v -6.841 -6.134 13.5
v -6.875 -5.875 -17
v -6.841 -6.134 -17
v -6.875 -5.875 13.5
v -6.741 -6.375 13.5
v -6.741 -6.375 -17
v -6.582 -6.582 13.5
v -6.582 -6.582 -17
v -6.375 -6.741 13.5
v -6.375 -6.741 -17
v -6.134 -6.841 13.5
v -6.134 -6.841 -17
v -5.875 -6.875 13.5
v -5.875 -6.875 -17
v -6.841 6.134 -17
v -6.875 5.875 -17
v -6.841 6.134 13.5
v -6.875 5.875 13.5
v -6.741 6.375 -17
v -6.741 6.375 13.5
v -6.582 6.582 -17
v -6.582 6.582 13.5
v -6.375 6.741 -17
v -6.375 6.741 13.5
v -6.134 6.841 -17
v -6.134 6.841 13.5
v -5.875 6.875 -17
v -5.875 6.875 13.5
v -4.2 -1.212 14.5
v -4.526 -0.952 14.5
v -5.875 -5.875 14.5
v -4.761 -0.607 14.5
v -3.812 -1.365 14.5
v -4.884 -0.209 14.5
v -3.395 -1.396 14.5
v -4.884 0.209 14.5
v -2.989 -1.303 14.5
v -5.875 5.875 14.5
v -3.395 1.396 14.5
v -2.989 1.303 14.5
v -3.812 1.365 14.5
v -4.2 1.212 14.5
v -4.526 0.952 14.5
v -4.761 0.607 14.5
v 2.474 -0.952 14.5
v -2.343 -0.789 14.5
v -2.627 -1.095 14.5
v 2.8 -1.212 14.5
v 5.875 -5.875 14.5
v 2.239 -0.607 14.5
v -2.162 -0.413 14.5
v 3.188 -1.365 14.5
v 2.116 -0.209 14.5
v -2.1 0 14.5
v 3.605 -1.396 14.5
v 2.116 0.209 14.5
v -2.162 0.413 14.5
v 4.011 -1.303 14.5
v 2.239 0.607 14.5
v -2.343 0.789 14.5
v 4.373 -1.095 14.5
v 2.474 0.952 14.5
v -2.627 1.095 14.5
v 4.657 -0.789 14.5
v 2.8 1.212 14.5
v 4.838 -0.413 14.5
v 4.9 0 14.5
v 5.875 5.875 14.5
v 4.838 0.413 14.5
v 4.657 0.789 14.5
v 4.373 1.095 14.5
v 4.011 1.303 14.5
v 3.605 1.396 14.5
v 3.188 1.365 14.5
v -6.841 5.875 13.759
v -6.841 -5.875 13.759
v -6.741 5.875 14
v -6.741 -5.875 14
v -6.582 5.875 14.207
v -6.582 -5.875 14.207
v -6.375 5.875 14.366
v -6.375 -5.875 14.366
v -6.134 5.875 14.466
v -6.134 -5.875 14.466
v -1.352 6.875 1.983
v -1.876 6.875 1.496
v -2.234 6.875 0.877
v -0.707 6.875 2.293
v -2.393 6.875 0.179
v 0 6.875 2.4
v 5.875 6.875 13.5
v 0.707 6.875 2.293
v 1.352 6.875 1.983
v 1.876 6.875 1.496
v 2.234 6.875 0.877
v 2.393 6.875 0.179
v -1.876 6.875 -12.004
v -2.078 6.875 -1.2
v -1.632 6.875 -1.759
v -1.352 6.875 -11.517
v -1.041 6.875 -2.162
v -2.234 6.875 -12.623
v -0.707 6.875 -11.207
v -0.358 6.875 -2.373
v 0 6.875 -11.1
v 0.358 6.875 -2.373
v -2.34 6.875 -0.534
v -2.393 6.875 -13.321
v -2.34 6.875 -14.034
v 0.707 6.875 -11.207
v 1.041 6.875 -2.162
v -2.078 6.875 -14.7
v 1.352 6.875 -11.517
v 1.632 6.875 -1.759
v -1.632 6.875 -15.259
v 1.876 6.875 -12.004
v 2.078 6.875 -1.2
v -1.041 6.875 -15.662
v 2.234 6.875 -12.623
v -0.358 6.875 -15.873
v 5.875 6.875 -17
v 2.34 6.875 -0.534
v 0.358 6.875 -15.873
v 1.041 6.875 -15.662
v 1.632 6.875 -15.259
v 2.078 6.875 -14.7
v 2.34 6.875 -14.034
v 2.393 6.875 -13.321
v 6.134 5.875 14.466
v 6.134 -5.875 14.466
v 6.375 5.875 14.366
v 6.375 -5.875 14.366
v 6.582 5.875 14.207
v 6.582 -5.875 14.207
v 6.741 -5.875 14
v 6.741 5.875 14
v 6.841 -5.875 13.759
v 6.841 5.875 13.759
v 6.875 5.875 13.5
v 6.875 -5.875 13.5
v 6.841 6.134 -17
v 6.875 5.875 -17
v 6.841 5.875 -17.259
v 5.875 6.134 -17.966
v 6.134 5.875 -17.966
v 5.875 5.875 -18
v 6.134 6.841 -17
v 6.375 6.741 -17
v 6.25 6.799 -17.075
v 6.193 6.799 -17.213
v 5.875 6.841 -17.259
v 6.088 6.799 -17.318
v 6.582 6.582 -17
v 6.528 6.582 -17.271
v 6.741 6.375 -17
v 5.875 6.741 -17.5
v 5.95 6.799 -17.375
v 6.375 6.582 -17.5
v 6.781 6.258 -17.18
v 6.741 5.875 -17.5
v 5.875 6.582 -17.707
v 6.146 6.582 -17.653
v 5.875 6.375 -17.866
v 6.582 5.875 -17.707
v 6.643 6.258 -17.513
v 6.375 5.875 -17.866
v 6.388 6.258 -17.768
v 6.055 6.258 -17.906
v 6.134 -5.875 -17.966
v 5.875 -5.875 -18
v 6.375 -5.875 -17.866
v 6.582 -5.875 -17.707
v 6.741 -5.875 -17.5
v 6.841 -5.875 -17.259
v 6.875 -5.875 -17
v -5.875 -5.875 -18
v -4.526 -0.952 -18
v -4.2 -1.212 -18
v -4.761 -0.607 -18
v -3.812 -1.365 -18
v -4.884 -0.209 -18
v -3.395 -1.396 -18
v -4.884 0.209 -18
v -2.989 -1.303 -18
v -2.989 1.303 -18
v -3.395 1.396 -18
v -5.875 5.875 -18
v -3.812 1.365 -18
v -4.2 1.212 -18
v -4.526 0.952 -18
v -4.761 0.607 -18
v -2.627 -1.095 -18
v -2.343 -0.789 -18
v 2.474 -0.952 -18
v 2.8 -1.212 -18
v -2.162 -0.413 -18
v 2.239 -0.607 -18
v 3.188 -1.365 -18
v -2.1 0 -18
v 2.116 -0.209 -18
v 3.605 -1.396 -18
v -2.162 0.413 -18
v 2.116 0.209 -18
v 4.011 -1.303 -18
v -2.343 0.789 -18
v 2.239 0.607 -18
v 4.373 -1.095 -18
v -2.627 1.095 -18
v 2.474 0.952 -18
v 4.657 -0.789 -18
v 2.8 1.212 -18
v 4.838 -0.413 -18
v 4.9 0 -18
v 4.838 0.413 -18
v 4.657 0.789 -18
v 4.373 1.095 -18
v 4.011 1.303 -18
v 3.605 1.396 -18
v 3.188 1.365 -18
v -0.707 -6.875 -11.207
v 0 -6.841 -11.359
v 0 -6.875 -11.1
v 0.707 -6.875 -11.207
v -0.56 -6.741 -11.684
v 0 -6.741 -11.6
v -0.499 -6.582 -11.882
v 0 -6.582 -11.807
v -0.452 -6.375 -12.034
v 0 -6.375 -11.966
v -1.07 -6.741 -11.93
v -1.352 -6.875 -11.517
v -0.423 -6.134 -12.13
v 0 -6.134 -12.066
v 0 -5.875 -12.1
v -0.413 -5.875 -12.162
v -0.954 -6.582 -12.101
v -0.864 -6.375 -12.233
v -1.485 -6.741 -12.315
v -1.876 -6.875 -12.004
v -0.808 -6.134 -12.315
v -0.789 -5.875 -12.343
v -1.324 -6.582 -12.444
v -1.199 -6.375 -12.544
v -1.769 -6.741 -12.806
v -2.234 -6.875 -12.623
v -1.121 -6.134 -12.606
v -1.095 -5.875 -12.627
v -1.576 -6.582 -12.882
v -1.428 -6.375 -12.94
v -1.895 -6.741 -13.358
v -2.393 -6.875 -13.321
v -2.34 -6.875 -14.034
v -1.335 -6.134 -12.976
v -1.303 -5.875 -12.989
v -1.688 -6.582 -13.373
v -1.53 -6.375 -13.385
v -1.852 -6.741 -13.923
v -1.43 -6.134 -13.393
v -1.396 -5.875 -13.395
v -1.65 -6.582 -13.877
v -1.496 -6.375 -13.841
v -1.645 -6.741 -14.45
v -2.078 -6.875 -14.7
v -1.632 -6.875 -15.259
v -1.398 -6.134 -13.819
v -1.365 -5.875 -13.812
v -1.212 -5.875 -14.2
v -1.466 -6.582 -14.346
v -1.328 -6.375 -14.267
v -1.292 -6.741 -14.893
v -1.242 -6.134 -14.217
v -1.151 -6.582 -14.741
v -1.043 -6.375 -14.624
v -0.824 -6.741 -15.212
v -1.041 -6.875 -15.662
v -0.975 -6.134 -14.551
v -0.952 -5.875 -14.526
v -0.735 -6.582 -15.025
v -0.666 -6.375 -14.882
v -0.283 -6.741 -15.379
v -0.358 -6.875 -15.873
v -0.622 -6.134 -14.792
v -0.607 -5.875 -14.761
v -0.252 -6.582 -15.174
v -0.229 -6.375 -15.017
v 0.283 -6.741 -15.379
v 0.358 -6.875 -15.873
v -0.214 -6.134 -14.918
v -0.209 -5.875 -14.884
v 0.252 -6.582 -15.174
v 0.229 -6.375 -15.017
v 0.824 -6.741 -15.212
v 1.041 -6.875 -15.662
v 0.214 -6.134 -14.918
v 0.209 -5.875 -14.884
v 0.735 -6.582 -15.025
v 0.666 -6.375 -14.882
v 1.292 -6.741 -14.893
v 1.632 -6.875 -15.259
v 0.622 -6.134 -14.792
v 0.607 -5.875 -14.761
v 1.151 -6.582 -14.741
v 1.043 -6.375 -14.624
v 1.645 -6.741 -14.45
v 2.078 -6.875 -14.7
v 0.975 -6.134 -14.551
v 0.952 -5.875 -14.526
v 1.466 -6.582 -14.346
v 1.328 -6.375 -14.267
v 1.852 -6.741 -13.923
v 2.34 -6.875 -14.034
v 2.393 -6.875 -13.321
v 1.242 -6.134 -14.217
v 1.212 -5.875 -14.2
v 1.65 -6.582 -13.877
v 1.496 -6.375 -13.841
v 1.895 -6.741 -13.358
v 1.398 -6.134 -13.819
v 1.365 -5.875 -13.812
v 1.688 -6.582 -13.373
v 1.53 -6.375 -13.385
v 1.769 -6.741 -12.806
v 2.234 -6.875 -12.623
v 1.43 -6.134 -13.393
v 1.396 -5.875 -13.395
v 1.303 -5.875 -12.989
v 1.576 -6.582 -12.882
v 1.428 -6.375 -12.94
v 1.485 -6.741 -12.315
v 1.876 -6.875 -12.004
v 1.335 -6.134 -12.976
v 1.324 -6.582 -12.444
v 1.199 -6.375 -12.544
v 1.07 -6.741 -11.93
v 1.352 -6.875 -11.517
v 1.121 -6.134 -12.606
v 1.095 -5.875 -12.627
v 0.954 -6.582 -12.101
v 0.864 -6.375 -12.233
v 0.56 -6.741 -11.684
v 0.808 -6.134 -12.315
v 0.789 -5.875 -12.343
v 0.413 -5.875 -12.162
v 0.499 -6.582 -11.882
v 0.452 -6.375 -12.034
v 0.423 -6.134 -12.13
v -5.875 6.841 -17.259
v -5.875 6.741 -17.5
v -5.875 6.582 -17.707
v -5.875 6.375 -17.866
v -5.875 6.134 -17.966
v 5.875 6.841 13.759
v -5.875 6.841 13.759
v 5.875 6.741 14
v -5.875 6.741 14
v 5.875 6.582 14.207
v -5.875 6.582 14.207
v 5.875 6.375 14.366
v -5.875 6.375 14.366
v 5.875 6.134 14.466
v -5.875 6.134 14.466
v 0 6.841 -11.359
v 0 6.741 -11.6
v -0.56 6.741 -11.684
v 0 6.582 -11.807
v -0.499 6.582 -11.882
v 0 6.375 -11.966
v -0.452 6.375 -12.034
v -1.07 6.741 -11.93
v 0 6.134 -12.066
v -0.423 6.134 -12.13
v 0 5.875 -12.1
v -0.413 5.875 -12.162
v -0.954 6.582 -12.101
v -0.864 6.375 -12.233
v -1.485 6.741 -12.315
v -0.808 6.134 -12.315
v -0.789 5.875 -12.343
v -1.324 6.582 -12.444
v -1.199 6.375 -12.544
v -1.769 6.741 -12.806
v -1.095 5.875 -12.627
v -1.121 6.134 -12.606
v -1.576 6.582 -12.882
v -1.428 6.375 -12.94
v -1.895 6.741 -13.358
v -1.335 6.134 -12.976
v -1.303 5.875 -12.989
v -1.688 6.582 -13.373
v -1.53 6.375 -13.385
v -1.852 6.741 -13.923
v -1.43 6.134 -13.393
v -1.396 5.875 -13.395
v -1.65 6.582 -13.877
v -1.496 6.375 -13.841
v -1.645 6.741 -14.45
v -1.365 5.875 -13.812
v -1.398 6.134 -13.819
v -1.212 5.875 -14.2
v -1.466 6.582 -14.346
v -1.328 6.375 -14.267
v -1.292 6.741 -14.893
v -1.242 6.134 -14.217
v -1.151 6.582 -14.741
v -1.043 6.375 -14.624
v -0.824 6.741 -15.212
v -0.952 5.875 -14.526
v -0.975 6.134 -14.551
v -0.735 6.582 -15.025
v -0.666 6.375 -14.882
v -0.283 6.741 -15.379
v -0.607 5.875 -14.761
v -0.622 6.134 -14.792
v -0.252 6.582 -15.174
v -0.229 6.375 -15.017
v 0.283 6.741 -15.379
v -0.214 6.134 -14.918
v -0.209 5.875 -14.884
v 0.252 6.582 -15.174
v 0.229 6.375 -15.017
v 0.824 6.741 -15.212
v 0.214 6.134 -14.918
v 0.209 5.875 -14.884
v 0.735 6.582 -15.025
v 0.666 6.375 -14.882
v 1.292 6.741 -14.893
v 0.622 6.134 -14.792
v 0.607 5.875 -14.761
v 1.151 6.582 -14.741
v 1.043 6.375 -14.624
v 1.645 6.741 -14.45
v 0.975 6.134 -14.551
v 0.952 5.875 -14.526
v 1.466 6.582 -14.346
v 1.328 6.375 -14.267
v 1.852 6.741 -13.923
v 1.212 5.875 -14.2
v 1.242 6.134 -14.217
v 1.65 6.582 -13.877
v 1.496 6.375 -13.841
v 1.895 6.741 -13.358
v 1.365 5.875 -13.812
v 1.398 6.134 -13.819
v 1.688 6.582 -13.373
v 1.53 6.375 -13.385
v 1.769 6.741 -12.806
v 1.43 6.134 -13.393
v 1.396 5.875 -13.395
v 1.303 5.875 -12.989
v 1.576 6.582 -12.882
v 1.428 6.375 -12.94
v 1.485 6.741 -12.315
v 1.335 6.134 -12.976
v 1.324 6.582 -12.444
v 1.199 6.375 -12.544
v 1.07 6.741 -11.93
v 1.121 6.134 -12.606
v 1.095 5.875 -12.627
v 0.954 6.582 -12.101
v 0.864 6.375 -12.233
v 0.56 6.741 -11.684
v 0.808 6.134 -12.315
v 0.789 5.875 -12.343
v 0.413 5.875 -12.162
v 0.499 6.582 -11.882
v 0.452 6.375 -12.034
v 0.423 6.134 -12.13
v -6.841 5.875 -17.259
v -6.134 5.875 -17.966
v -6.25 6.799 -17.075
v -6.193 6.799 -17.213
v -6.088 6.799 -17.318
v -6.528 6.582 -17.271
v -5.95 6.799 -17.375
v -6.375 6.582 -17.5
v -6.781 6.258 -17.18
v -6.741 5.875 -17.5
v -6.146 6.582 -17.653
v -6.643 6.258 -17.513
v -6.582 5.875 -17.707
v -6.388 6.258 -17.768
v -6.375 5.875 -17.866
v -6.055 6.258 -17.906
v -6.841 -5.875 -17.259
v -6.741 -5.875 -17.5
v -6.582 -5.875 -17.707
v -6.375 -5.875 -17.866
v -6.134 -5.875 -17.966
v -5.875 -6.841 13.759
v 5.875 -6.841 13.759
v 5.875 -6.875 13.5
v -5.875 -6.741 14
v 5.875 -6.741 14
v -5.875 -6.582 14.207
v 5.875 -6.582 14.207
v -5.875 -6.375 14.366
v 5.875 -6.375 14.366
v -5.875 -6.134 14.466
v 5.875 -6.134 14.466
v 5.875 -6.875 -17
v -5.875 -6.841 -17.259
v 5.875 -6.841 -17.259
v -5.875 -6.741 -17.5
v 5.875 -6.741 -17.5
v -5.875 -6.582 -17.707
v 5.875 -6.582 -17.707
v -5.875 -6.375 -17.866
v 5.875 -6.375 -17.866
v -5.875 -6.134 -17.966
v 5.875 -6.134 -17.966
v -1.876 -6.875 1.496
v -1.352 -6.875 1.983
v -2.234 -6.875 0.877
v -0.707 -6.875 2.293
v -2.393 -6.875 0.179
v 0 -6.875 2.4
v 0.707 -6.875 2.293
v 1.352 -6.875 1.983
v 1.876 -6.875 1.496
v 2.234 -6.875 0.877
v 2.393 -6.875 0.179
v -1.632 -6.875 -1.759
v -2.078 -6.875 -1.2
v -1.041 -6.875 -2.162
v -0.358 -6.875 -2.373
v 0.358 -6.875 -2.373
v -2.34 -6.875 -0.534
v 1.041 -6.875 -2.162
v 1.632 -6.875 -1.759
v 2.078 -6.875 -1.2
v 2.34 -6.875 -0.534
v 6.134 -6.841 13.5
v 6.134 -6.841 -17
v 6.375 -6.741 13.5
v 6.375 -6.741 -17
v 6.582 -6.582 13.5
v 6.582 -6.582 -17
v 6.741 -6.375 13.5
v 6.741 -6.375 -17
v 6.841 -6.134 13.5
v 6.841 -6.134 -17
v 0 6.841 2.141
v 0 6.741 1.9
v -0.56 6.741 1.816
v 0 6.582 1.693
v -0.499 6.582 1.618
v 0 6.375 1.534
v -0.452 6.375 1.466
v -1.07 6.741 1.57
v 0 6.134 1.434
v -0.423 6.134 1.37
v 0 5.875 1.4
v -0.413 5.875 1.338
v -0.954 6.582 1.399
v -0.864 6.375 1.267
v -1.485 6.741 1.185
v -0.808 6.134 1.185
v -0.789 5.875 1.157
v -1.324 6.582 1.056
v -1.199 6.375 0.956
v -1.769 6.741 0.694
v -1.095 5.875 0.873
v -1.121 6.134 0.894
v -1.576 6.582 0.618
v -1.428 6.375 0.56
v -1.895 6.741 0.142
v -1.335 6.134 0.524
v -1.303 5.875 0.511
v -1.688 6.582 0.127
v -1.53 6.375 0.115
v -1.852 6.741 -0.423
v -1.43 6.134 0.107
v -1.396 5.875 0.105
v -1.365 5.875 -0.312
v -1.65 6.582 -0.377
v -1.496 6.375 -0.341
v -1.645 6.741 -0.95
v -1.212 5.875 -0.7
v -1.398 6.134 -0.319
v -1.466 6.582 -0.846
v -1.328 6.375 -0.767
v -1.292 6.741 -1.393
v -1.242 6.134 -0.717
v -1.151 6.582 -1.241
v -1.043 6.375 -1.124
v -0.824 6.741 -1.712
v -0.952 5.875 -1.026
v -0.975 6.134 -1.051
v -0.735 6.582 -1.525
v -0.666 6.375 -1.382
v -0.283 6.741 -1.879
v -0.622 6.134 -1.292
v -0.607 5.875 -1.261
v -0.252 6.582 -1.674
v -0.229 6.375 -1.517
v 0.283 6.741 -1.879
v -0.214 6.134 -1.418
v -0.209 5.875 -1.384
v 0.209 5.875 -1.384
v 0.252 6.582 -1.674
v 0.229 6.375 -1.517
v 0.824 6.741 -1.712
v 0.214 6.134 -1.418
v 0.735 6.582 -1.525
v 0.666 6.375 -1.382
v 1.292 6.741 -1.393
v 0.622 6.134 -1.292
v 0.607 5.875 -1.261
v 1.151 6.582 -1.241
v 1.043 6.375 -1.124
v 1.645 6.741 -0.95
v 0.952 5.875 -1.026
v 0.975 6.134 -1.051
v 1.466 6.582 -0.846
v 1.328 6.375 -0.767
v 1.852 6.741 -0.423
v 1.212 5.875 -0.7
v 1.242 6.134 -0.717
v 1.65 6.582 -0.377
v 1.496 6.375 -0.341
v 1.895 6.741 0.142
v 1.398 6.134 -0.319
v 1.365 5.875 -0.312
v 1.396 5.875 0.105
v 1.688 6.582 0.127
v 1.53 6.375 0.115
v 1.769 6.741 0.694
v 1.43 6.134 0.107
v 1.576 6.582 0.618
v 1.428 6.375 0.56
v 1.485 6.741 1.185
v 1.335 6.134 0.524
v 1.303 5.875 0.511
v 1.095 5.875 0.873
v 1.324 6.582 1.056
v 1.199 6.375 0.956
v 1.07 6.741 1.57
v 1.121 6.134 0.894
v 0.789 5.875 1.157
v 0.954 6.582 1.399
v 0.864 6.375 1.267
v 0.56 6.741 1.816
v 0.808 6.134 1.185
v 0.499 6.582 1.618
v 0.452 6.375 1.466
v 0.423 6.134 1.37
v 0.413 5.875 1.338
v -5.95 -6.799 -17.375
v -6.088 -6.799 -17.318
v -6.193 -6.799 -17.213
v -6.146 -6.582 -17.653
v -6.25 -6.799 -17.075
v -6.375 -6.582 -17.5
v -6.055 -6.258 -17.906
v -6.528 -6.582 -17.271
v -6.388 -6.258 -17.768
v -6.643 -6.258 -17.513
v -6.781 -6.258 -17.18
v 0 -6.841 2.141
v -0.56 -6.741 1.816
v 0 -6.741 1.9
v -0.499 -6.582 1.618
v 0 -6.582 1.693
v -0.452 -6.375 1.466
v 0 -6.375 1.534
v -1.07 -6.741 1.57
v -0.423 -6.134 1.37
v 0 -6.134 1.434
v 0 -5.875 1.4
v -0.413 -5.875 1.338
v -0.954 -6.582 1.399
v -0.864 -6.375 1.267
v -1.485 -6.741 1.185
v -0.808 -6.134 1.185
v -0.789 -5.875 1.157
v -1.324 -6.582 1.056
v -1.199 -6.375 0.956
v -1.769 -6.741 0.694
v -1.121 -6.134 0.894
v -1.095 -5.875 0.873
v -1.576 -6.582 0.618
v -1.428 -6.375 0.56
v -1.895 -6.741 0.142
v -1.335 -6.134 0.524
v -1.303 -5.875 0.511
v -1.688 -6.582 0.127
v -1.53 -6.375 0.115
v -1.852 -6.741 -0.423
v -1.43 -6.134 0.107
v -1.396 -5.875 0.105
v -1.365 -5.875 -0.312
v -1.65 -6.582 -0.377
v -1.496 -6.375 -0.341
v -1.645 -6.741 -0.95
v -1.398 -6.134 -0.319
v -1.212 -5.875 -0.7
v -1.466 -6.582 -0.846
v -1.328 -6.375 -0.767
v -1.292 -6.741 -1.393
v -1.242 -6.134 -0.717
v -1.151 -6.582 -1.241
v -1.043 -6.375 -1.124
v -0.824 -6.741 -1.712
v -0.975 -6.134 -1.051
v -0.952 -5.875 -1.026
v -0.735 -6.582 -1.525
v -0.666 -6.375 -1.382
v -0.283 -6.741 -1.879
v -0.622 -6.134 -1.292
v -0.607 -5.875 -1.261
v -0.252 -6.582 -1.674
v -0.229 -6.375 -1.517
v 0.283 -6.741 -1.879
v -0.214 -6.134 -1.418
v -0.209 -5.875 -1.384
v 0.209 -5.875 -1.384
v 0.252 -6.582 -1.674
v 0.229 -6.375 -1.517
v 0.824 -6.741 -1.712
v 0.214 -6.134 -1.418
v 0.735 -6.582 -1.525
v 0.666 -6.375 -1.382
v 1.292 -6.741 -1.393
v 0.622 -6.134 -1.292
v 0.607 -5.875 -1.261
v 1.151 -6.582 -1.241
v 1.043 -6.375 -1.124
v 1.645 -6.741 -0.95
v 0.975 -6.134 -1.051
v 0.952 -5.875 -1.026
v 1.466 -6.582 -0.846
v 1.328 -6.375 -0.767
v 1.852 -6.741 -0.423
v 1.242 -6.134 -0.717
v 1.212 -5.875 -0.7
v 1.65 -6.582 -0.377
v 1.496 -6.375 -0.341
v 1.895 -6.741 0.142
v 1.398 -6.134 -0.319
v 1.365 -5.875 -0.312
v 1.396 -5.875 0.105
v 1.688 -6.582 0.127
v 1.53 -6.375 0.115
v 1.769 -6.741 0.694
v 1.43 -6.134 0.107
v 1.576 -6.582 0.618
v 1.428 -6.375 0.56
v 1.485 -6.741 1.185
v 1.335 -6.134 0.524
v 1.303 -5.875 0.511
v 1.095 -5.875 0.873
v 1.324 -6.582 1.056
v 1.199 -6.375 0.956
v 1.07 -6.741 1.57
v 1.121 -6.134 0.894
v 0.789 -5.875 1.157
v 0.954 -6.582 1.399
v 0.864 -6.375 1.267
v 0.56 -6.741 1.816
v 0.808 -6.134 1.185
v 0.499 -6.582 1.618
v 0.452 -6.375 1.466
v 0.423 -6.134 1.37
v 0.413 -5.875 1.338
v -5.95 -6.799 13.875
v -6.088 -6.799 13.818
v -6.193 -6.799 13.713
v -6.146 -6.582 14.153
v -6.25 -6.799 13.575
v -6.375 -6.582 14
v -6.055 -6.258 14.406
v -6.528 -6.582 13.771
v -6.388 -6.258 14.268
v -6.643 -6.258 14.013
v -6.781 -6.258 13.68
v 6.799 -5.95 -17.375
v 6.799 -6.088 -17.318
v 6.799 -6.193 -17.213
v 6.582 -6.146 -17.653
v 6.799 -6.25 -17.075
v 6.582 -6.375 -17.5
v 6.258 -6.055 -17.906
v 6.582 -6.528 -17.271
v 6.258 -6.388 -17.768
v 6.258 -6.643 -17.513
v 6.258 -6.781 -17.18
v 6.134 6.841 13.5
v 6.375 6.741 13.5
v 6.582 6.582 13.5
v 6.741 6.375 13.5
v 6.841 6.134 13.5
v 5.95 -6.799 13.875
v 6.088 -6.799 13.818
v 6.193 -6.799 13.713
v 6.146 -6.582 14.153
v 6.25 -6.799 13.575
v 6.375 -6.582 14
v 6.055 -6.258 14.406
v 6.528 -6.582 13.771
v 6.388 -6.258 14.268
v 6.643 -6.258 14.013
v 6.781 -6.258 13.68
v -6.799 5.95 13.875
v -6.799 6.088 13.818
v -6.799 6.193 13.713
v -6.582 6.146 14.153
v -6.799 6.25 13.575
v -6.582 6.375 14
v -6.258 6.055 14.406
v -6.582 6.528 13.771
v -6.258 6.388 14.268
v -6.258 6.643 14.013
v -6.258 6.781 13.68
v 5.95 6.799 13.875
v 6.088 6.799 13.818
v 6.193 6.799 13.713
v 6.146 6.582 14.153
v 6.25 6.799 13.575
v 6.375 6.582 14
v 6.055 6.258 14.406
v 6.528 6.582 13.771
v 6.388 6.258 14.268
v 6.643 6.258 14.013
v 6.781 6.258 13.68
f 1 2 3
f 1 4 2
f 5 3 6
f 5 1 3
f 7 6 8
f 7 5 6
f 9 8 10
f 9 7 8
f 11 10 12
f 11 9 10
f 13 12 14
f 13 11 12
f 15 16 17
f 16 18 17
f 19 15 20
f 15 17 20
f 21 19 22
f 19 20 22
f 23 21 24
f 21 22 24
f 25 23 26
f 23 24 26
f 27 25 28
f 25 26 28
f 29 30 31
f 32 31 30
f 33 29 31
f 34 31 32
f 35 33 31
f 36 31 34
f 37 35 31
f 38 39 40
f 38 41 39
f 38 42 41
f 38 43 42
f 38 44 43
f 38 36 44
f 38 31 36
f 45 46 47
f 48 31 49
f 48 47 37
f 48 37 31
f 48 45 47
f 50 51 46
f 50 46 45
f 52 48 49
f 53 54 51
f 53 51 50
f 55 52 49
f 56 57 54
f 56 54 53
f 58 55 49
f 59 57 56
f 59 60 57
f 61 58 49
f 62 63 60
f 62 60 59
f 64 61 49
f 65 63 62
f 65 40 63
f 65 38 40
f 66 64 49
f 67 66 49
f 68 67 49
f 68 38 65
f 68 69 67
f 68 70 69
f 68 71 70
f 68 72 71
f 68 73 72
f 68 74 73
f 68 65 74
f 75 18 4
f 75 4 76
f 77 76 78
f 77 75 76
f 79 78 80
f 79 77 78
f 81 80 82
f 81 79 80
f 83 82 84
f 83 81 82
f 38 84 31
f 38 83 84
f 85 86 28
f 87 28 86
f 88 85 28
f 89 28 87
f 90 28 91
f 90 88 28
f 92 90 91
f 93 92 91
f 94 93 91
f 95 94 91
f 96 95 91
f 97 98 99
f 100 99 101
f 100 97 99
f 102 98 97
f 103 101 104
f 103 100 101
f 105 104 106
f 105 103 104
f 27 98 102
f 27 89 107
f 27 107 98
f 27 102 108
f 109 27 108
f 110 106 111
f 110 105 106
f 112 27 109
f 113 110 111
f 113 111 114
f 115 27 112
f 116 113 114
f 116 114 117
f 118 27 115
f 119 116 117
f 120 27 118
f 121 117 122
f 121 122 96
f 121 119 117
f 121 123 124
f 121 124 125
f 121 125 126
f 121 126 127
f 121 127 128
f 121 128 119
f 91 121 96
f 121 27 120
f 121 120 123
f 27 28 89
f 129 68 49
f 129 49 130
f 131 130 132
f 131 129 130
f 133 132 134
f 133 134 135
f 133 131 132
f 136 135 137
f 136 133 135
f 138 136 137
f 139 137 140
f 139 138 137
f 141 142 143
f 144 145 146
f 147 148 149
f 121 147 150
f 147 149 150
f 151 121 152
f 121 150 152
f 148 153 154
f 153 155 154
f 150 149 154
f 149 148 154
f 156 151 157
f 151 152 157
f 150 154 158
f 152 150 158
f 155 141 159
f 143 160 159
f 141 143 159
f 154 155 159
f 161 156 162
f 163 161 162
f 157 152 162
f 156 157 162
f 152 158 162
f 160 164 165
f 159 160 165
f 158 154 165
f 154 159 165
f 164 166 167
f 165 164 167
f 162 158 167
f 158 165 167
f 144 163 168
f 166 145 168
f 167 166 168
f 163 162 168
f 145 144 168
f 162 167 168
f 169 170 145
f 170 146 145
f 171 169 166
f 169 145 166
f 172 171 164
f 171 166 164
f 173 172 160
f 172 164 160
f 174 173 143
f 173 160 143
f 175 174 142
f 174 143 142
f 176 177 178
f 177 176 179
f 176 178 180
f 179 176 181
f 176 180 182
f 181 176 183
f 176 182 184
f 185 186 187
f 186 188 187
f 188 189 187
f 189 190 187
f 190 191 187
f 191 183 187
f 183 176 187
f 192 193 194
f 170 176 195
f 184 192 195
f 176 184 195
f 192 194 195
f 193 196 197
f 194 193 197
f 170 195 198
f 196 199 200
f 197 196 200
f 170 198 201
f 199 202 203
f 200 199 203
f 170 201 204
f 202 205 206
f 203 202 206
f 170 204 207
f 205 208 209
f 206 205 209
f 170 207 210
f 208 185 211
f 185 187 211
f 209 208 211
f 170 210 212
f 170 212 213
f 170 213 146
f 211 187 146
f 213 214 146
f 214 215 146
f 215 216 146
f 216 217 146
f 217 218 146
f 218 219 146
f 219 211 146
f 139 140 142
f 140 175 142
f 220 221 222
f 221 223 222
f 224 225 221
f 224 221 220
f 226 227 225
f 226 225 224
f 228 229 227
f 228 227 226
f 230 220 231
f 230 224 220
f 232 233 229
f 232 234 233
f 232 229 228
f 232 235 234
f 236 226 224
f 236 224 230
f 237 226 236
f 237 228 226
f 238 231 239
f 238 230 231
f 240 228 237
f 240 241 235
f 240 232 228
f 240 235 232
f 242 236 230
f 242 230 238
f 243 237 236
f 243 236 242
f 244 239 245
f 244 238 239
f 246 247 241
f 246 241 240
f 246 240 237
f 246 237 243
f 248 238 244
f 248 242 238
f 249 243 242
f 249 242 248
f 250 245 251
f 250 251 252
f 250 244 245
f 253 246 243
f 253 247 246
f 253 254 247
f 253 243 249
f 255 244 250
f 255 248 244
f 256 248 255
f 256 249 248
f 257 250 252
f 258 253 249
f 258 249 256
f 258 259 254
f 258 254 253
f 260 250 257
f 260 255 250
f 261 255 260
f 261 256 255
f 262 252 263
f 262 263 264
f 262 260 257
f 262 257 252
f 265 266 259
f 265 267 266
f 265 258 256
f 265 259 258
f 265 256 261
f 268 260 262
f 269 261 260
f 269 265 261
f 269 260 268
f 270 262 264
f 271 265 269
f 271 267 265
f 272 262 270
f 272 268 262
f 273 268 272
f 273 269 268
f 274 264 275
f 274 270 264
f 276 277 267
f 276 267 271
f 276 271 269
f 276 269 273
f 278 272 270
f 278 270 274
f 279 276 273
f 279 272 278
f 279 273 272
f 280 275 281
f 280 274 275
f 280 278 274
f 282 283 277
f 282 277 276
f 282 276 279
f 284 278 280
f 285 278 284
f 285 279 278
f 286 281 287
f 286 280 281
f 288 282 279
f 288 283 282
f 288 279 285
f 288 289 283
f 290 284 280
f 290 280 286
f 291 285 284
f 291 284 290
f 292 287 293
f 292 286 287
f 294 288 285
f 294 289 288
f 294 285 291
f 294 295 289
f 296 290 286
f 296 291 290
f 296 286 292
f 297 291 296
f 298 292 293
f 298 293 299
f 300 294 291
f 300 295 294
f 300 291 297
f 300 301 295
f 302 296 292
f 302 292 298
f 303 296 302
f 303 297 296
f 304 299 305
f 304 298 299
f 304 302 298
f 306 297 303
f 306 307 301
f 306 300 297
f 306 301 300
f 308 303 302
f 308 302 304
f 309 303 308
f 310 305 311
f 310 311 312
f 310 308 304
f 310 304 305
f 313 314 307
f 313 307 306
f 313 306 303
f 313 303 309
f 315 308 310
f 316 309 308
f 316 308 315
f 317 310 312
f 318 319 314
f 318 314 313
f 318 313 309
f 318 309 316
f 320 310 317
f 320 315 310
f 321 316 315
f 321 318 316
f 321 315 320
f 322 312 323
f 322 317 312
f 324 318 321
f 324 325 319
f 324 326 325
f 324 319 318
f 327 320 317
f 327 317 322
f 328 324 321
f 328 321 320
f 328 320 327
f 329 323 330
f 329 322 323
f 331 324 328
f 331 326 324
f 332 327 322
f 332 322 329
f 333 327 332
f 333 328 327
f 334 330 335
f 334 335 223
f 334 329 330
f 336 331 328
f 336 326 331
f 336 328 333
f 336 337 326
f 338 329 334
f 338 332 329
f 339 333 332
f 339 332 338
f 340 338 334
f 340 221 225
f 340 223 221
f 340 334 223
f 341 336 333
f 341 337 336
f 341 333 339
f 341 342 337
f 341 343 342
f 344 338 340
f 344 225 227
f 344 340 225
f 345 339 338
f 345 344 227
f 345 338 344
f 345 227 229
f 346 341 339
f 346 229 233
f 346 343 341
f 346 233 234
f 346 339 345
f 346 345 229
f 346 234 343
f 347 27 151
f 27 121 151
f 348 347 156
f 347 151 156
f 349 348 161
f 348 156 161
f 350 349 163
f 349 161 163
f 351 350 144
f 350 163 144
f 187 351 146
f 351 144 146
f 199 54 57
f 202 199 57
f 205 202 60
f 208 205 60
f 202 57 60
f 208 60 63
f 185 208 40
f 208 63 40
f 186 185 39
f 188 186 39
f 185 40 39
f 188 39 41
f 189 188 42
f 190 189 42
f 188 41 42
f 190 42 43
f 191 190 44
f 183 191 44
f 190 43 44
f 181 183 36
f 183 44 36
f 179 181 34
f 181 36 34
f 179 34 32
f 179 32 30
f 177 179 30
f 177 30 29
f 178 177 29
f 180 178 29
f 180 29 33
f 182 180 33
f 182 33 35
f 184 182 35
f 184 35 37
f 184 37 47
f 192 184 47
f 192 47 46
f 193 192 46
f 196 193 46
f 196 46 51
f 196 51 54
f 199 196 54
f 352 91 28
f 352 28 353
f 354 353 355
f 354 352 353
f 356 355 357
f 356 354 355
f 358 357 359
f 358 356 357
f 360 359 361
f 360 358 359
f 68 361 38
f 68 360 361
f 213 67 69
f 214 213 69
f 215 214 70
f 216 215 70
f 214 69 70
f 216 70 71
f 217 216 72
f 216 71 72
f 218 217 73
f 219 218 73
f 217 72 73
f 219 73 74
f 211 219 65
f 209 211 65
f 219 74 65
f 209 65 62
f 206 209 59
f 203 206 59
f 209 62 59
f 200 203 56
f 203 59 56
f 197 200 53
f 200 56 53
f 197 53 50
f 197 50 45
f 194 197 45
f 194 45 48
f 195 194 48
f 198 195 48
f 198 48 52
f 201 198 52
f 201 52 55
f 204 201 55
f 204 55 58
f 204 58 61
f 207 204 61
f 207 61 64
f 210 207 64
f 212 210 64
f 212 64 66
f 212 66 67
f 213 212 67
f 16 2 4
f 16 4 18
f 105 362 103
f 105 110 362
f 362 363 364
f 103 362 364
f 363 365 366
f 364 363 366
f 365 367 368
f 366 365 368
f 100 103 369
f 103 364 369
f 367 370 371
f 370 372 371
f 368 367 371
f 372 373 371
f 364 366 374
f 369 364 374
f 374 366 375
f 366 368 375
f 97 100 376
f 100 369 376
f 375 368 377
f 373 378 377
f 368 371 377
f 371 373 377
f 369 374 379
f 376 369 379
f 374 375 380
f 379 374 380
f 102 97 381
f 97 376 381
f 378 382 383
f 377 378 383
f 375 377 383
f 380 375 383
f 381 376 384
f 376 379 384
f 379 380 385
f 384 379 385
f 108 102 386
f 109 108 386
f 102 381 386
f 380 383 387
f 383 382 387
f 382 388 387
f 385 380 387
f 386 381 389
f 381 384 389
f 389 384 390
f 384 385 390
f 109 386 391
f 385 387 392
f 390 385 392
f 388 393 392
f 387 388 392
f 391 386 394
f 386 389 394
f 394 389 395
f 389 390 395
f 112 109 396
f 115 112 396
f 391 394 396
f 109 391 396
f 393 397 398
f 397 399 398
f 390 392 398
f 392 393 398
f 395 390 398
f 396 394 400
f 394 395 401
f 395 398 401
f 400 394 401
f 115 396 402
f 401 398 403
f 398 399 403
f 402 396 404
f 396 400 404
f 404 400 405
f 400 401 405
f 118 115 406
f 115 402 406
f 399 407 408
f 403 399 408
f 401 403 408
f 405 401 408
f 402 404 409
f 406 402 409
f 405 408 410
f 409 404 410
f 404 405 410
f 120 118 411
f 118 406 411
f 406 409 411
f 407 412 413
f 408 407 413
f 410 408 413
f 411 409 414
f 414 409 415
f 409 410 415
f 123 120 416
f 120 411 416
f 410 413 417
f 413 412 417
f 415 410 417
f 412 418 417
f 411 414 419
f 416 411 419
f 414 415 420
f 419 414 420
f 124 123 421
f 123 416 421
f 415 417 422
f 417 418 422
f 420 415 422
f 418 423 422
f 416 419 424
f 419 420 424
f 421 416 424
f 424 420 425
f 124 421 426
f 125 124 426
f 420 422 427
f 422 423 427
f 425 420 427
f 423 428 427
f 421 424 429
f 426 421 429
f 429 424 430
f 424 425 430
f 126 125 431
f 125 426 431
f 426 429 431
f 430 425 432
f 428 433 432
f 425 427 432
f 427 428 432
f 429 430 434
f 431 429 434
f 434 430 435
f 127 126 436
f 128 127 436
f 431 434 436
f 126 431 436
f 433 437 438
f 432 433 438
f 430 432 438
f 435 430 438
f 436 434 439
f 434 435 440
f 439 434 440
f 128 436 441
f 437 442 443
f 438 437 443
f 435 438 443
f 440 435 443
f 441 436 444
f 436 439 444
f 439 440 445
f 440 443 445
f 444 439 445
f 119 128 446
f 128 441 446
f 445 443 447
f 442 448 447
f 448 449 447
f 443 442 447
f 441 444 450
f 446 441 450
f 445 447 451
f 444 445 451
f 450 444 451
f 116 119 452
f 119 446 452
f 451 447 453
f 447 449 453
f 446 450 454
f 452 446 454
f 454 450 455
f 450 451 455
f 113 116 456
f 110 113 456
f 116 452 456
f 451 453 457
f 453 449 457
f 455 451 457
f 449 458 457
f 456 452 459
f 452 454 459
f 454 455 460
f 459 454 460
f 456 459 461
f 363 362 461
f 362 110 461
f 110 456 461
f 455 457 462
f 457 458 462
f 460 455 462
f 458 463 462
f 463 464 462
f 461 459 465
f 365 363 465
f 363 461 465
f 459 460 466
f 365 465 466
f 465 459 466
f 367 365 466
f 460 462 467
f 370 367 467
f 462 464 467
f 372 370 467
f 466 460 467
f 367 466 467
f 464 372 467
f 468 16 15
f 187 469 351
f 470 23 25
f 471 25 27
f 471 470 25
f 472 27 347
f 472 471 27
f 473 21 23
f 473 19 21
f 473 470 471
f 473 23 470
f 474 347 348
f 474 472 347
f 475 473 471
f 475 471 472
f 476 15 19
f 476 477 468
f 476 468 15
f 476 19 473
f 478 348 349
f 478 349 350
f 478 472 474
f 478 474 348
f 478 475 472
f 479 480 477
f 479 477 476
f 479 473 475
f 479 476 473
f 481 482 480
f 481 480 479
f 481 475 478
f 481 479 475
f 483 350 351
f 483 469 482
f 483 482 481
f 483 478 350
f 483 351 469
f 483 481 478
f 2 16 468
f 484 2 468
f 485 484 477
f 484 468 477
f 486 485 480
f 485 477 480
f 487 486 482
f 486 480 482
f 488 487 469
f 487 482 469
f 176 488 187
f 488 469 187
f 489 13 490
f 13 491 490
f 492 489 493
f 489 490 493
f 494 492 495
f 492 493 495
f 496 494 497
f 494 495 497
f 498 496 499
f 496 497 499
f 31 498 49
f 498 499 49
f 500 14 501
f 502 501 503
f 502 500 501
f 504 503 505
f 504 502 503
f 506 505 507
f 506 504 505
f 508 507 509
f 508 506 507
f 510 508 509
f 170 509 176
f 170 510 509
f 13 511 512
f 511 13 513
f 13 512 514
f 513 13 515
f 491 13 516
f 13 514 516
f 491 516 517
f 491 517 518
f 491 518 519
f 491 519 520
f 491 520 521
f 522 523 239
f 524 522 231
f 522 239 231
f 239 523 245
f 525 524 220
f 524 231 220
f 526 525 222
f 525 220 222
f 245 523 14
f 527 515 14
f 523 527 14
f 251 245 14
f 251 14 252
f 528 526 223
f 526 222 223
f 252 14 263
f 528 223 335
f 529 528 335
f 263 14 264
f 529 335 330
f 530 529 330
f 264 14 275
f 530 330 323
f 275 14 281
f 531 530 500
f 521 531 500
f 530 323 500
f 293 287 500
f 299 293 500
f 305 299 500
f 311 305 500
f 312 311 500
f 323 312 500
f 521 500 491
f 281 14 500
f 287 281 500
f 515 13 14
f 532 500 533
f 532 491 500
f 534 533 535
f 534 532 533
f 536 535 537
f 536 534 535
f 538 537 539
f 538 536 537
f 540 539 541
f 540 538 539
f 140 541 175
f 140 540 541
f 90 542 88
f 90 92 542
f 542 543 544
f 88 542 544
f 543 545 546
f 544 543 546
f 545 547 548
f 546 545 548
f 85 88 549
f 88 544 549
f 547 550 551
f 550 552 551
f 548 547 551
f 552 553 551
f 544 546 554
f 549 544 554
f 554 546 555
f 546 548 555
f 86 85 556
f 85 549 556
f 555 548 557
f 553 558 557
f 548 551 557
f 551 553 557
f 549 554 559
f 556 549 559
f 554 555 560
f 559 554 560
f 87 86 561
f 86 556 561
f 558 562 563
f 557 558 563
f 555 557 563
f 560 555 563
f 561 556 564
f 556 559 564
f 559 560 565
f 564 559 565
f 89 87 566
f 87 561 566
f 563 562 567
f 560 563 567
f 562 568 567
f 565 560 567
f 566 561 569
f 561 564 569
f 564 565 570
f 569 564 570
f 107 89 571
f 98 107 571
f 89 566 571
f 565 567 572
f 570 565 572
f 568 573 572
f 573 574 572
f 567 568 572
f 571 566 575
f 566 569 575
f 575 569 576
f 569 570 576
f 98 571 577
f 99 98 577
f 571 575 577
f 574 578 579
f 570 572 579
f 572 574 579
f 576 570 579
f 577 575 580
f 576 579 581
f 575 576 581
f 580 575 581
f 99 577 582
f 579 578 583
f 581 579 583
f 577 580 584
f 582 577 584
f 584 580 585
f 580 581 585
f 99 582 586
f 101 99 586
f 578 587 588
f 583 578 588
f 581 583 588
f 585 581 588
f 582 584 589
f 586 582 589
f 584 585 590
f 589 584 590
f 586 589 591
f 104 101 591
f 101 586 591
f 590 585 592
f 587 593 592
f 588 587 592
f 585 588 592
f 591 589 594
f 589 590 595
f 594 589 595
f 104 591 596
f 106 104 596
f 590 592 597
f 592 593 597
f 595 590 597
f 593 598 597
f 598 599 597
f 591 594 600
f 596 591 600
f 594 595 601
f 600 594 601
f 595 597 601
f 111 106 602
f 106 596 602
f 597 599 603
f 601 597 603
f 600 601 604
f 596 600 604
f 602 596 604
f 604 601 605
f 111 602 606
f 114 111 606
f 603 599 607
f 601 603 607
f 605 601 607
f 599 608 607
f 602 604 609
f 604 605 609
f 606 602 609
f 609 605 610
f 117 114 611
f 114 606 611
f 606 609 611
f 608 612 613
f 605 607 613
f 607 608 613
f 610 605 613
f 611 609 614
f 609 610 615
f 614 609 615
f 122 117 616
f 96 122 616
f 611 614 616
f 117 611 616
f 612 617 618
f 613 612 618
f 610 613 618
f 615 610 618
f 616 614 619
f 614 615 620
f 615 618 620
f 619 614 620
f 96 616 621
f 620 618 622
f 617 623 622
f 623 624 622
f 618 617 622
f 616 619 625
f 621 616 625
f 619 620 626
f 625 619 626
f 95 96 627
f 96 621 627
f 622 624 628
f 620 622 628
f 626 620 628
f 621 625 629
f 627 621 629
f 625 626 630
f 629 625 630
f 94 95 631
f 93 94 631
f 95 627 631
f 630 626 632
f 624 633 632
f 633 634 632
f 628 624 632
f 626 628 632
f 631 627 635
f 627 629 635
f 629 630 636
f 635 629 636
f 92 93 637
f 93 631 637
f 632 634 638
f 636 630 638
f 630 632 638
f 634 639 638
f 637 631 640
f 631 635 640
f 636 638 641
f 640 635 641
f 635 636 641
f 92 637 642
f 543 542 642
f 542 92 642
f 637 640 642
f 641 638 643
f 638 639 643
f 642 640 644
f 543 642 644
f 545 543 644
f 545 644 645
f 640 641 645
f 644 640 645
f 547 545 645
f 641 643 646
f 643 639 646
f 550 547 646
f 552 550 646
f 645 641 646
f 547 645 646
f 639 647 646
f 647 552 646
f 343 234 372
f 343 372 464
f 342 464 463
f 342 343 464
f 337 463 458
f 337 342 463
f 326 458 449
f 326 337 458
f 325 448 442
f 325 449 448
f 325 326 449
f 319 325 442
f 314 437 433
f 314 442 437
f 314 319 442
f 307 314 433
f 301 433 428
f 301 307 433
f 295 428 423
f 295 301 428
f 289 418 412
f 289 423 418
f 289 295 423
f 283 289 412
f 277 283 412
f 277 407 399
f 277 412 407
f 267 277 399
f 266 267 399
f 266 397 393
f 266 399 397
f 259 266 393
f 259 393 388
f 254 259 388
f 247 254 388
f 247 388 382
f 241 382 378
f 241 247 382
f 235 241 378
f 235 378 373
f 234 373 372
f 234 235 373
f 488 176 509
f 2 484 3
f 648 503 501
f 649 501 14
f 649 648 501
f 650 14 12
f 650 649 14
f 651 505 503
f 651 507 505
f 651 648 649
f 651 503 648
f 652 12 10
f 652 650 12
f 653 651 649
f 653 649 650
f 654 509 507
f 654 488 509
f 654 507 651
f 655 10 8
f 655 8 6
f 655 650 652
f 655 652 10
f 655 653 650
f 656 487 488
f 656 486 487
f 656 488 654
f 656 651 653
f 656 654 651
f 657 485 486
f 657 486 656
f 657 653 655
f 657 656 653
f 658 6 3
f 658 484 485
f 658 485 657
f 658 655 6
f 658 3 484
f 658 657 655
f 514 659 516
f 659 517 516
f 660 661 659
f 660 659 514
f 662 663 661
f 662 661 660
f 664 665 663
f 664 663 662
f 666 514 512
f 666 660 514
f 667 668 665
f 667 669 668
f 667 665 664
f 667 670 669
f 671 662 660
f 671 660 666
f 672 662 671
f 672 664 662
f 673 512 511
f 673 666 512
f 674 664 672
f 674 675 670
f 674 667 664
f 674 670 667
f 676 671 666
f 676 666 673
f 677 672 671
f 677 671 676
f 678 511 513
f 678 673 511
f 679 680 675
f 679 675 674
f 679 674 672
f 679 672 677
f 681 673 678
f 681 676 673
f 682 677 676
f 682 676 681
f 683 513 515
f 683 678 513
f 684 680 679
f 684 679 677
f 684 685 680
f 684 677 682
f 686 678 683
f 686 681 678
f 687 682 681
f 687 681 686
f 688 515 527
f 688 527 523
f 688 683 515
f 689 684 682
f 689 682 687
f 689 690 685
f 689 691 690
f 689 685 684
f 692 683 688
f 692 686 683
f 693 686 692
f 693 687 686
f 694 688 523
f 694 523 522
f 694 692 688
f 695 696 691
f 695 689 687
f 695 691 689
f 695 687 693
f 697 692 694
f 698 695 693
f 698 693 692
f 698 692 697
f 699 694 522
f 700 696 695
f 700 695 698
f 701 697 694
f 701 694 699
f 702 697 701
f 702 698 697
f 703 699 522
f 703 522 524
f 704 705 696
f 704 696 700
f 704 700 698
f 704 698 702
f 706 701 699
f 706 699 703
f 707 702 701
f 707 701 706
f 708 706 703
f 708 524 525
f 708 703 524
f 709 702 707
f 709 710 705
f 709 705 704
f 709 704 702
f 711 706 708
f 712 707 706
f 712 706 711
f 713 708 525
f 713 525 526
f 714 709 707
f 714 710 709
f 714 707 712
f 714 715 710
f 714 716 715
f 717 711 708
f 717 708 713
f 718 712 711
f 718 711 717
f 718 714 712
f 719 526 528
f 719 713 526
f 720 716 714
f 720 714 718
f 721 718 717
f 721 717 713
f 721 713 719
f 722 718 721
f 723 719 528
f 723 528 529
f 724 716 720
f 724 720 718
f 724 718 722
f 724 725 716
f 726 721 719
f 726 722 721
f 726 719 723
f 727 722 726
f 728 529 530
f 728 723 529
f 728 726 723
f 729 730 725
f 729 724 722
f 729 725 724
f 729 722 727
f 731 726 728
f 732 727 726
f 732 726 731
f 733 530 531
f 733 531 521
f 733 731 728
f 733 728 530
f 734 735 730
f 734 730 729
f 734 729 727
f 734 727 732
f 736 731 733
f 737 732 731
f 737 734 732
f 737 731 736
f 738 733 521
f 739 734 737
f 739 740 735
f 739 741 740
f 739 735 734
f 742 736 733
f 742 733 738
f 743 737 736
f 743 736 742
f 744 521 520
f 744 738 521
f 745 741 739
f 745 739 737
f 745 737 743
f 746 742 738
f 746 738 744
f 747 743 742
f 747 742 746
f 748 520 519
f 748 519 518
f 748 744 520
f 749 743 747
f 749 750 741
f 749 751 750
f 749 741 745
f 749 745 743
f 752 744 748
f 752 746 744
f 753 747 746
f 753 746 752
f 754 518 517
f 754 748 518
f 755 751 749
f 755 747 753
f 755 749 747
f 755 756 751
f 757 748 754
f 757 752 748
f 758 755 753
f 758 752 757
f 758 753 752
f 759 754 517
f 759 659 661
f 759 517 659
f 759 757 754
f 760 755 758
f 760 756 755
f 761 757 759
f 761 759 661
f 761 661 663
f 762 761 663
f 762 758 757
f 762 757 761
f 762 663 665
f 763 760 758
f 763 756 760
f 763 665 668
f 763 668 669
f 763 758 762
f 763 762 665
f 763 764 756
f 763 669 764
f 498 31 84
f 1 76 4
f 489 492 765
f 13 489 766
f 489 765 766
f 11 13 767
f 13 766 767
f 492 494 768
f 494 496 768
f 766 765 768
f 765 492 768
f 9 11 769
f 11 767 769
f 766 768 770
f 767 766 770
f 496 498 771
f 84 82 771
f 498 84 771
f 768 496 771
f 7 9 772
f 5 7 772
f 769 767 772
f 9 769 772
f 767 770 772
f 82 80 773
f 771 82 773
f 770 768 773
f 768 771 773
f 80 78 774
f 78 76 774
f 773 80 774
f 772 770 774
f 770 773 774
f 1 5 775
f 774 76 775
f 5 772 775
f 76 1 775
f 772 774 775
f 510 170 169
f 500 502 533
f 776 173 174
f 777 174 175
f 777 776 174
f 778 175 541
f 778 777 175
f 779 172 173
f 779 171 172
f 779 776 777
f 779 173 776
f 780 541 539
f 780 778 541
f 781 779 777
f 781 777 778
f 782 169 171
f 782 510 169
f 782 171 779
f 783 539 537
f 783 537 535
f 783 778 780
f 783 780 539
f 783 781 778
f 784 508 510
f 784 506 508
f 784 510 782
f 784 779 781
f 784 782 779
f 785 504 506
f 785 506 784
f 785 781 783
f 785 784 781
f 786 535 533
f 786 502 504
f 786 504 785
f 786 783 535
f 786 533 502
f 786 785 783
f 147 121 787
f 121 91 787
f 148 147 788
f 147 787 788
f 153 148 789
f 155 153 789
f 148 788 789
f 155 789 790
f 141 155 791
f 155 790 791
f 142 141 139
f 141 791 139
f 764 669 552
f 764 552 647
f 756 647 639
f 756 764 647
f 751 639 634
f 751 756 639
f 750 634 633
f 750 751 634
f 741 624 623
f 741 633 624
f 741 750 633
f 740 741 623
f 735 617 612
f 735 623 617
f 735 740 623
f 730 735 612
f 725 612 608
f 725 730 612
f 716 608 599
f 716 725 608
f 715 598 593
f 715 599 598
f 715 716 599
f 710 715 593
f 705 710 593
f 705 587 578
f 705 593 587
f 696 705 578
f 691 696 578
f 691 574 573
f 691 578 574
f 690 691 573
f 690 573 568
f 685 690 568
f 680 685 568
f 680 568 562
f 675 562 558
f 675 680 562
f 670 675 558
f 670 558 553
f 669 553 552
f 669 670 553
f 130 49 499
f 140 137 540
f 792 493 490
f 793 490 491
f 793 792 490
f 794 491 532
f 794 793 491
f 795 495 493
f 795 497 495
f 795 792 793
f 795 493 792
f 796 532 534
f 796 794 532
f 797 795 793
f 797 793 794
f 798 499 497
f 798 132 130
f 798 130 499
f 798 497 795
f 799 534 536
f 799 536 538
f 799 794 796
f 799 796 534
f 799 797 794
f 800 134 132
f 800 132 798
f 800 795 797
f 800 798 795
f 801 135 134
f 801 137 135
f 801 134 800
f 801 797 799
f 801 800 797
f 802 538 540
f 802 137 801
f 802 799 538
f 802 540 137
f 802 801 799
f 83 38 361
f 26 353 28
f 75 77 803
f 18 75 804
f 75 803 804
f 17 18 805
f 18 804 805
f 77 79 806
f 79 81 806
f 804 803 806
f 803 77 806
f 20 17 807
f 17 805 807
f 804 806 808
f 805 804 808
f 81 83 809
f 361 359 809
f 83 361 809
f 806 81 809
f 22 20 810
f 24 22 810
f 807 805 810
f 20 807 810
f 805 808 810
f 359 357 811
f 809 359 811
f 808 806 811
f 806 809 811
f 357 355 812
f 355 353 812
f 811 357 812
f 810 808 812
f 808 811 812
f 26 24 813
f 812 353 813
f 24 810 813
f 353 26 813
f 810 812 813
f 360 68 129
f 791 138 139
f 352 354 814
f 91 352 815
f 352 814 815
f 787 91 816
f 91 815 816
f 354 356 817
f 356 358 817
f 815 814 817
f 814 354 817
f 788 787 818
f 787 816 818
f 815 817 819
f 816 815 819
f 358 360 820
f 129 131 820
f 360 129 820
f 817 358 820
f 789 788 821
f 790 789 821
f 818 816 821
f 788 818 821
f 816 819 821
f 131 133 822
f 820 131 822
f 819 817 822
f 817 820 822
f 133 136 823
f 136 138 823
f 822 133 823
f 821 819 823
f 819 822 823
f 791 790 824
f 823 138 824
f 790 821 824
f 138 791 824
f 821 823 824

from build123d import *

# Parameters (mm, degrees)
BOSS_EXTRUDE1_DEPTH      = 14.5
BOSS_EXTRUDE1_DEPTH_BACK = 18
SKETCH1_W                = 13.75
SKETCH1_H                = 13.75
CUT_EXTRUDE1_DEPTH       = 21.458036318
CUT_EXTRUDE1_DEPTH_BACK  = 21.458036318
SKETCH2_R                = 1.4
FILLET1_R                = 1
FILLET2_R                = 1
SKETCH3_R                = 1.4
CUT_EXTRUDE2_DEPTH       = 34.923166863


with BuildPart() as part:
    # Sketch1 → Boss-Extrude1 (new, two sides: drawn at the far end of the back side and taken through both)
    with BuildSketch(Plane.XY.offset(-BOSS_EXTRUDE1_DEPTH_BACK)):
        Rectangle(SKETCH1_W, SKETCH1_H)
    extrude(amount=BOSS_EXTRUDE1_DEPTH + BOSS_EXTRUDE1_DEPTH_BACK)

    # Sketch2 → Cut-Extrude1 (cut, two sides: drawn at the far end of the back side and taken through both)
    with BuildSketch(Plane(origin=(0, 0, 0), x_dir=(1, 0, 0), z_dir=(0, 1, 0)).offset(-CUT_EXTRUDE1_DEPTH_BACK)):
        with Locations(Location((0, 0, 0), (0, 0, 270))):
            Circle(SKETCH2_R)
        with Locations(Location((0, 13.5, 0), (0, 0, 270))):
            Circle(SKETCH2_R)
    extrude(amount=CUT_EXTRUDE1_DEPTH + CUT_EXTRUDE1_DEPTH_BACK, mode=Mode.SUBTRACT)

    # Fillet1
    fillet1_edges = [part.edges().sort_by_distance(p)[0] for p in [
        (6.875, 0, 14.5),
        (-6.875, 0, -18),
        (0, 6.875, 14.5),
        (-6.875, 0, 14.5),
        (0, -6.875, 14.5),
        (0, -6.875, -18),
        (6.875, 0, -18),
        (6.875, -6.875, -1.75),
        (-6.875, -6.875, -1.75),
        (-6.875, 6.875, -1.75),
        (6.875, 6.875, -1.75),
        (0, 6.875, -18),
    ]]
    fillet(fillet1_edges, radius=FILLET1_R)

    # Fillet2
    fillet2_edges = [part.edges().sort_by_distance(p)[0] for p in [
        (0, -6.875, -1.4),
        (0, 6.875, -1.4),
        (0, -6.875, -14.9),
        (0, 6.875, -14.9),
    ]]
    fillet(fillet2_edges, radius=FILLET2_R)

    # Sketch3 → Cut-Extrude2 (cut, through all)
    with BuildSketch(Plane.XY.offset(14.5)):
        with Locations((-3.5, 0)):
            Circle(SKETCH3_R)
        with Locations((3.5, 0)):
            Circle(SKETCH3_R)
    extrude(amount=-CUT_EXTRUDE2_DEPTH, mode=Mode.SUBTRACT)


solid = part.part
